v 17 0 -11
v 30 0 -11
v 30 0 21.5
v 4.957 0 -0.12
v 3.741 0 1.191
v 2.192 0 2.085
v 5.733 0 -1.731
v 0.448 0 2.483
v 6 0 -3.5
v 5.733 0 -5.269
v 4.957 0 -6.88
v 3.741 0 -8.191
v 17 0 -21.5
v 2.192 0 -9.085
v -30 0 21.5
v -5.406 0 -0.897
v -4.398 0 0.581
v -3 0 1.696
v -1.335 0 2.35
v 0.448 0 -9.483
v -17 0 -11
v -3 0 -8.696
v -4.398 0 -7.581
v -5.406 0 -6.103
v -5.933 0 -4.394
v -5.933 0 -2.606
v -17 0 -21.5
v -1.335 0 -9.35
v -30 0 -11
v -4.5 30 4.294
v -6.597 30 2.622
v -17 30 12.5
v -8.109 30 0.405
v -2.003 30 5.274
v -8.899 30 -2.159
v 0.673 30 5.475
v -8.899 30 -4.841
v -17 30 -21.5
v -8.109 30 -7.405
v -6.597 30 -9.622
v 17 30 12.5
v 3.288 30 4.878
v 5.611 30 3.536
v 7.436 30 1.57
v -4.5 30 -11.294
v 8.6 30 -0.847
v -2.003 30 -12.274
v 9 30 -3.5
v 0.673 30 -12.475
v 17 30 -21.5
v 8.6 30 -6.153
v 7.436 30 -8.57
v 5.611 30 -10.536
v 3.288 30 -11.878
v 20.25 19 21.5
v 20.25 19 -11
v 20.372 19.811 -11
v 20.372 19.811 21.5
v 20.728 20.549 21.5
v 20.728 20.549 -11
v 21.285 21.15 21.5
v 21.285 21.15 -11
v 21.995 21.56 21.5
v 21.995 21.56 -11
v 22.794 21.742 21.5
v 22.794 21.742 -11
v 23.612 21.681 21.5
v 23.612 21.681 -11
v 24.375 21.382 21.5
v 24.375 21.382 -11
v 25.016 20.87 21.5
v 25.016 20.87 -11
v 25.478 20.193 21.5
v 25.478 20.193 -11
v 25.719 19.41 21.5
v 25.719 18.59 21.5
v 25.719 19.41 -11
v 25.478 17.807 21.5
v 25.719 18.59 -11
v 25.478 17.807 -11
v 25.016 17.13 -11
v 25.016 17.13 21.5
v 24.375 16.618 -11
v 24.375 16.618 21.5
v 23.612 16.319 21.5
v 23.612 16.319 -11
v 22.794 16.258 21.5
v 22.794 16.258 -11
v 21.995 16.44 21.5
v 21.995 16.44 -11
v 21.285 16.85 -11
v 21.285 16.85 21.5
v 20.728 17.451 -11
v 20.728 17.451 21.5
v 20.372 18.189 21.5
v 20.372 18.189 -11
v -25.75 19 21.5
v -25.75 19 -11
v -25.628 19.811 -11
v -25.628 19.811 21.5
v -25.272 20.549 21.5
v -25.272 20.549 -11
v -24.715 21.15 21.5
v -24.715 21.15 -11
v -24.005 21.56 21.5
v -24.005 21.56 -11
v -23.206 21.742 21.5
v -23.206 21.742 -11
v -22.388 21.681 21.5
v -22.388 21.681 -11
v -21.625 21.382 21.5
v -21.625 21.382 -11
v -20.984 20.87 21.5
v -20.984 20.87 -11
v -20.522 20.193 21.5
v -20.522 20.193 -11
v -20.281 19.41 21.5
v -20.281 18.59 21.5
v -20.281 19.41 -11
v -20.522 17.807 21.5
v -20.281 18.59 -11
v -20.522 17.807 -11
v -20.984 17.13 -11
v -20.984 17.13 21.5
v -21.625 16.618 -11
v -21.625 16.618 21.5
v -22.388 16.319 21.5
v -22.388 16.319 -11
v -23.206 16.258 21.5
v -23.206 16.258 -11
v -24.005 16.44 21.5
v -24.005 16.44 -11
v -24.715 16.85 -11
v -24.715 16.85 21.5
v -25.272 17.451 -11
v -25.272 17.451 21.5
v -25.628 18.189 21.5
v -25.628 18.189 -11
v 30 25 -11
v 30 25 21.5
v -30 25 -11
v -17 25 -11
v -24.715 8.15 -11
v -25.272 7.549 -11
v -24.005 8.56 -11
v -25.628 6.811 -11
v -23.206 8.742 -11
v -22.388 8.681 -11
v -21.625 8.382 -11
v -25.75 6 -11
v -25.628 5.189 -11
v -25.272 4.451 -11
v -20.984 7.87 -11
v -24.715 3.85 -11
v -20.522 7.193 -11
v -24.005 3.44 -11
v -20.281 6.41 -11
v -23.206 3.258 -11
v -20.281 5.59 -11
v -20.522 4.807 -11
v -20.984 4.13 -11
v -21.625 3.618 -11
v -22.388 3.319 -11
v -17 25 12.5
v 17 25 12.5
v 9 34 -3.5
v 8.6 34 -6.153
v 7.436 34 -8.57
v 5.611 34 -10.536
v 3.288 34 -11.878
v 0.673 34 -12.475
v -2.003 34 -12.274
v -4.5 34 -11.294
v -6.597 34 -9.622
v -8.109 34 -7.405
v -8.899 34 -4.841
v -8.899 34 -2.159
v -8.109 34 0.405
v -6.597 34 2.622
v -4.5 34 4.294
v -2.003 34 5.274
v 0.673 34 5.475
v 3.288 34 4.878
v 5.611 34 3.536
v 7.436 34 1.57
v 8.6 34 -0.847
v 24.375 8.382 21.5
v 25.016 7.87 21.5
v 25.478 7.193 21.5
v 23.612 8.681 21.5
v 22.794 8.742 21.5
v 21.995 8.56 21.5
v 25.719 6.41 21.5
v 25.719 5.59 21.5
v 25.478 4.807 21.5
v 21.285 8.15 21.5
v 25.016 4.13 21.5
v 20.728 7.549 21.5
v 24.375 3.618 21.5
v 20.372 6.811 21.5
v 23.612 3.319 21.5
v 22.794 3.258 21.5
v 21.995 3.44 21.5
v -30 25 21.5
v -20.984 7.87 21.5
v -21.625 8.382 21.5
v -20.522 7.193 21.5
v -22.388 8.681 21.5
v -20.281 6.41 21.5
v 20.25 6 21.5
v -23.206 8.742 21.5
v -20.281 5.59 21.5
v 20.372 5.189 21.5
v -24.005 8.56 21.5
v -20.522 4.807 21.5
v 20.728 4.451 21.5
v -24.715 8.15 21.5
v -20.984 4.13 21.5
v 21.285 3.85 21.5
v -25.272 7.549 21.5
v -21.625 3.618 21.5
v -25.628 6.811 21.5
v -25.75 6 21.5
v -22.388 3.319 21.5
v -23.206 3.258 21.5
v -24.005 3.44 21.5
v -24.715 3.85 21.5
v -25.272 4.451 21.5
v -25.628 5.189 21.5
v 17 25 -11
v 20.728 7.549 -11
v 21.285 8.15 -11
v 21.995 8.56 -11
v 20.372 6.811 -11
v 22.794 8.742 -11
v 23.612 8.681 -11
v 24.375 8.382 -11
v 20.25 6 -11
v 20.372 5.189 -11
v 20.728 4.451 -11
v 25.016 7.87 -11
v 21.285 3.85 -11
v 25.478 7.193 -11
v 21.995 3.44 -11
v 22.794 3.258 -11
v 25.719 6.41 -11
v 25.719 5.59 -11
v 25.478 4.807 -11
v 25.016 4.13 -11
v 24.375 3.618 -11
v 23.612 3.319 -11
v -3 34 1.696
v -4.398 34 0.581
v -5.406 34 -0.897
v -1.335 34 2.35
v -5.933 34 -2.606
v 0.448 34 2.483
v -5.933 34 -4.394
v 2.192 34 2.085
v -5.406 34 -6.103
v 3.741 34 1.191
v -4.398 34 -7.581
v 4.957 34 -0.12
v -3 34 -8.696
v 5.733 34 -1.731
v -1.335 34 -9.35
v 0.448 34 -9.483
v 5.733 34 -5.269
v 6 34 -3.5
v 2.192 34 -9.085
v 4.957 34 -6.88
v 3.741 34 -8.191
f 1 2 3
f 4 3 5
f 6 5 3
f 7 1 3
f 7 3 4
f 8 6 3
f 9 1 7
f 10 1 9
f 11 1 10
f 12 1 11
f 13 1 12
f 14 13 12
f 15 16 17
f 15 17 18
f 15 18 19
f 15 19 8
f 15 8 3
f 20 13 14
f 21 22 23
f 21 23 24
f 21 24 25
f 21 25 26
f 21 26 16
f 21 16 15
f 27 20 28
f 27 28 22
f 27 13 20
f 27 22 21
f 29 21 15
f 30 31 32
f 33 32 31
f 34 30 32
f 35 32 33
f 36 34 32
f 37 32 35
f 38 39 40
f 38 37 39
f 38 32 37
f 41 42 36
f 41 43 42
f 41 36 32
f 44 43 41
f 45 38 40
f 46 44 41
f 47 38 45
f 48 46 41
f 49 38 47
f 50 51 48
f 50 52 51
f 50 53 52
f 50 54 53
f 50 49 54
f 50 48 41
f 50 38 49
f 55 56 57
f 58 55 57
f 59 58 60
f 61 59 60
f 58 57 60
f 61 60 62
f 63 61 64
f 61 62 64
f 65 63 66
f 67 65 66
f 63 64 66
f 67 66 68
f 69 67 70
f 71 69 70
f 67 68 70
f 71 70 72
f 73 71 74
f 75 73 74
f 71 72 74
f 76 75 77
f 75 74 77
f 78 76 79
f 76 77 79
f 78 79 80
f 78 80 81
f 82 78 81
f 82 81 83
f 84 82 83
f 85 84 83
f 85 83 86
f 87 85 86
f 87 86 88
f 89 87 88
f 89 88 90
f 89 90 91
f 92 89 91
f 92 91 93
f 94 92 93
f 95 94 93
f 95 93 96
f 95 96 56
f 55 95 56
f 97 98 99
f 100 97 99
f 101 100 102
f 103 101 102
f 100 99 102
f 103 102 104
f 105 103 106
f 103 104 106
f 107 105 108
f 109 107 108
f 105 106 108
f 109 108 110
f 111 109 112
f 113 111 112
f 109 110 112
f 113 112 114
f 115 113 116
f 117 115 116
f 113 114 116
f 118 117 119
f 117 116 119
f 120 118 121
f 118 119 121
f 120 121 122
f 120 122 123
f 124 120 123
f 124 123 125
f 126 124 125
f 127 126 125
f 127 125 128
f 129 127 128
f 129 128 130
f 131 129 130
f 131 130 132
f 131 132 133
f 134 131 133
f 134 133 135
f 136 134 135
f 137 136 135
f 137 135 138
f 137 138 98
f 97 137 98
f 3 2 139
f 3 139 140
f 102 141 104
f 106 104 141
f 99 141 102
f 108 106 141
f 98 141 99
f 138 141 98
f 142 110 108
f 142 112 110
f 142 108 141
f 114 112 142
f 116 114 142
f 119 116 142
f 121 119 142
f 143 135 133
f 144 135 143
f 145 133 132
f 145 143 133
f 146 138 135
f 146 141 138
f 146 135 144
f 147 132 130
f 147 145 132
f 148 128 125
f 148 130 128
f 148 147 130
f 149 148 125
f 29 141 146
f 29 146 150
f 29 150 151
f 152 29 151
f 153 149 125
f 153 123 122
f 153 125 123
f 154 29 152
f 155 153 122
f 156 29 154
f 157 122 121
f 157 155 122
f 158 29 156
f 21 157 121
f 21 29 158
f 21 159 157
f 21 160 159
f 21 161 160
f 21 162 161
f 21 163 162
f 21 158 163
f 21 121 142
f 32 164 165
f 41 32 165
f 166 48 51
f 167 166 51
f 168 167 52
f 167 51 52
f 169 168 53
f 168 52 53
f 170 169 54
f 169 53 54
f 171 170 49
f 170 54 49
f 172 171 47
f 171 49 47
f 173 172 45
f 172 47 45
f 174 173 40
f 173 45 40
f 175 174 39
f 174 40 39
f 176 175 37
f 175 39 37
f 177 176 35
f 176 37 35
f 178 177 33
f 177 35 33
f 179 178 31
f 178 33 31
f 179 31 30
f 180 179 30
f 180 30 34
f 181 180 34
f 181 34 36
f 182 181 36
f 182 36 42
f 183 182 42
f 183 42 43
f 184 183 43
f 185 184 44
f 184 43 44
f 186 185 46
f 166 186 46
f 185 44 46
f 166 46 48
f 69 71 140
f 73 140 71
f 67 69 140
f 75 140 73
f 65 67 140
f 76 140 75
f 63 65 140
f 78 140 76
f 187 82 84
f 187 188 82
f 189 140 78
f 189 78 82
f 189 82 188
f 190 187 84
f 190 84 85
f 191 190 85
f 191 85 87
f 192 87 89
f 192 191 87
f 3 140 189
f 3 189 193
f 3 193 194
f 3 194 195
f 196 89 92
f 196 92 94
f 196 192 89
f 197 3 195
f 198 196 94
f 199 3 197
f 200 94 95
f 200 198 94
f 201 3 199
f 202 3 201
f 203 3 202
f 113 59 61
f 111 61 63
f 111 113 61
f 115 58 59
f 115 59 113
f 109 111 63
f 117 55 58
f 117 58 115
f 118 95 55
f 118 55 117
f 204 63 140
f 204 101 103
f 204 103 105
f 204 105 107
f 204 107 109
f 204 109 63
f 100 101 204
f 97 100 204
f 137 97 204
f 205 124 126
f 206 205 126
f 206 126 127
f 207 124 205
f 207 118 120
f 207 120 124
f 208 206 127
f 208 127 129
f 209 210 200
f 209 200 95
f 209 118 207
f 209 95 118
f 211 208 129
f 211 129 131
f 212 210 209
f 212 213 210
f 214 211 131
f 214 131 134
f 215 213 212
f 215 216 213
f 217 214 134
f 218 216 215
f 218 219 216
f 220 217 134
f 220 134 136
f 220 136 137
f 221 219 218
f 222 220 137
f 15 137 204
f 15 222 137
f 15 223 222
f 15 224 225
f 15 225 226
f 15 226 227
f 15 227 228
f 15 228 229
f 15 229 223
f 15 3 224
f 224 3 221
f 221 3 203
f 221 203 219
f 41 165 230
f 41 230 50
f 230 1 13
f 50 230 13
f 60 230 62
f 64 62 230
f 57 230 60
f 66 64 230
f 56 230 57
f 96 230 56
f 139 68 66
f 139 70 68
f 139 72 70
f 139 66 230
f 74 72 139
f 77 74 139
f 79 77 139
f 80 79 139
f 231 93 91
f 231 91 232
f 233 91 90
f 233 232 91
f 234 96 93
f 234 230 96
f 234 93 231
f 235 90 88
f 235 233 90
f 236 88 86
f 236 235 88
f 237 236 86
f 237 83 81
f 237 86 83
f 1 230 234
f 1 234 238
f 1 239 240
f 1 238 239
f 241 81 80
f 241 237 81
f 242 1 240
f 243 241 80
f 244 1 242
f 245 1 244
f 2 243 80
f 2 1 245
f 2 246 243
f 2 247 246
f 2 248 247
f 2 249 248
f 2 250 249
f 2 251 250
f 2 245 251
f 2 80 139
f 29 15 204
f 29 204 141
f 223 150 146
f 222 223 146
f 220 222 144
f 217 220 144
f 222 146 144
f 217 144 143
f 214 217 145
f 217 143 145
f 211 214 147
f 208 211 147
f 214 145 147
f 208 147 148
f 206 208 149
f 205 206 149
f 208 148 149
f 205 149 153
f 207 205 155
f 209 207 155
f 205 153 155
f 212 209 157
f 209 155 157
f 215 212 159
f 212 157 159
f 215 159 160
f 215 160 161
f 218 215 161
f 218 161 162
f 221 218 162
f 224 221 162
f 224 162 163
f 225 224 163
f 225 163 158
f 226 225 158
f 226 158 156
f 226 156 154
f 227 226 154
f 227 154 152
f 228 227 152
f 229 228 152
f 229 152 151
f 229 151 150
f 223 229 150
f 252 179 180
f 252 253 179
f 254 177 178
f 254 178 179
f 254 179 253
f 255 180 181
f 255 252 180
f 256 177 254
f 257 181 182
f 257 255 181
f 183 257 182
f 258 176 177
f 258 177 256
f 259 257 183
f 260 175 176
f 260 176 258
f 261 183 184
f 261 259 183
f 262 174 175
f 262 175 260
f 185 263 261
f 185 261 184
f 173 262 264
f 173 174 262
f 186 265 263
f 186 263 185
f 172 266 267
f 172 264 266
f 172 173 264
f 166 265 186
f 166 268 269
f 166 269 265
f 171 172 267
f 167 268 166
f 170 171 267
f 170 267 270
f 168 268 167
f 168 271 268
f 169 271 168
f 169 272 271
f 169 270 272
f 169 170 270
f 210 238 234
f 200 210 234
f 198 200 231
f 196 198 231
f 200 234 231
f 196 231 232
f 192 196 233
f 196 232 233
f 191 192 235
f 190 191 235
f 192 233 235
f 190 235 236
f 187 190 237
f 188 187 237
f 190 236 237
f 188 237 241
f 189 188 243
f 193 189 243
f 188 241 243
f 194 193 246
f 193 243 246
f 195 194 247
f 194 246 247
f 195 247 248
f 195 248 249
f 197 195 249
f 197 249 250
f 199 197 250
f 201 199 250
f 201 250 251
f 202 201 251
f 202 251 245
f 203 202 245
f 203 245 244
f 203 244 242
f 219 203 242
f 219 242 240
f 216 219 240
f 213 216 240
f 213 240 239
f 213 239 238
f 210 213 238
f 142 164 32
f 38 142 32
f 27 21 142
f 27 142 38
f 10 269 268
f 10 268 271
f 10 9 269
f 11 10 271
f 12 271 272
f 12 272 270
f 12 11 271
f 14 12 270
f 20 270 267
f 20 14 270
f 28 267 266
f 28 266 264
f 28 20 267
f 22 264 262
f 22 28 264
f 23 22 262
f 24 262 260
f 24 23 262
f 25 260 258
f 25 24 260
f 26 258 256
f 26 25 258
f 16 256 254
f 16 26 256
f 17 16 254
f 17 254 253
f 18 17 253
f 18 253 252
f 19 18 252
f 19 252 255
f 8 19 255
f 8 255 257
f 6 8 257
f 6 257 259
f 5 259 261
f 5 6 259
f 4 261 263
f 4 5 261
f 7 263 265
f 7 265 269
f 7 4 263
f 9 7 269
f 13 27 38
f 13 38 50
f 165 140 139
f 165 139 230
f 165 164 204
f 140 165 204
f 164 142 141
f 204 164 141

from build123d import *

# Parameters (mm, degrees)
SKETCH1_R           = 6
BOSS_EXTRUDE1_DEPTH = 25
SKETCH2_R           = 2.75
CUT_EXTRUDE1_DEPTH  = 33.5
SKETCH3_W           = 34
SKETCH3_H           = 34
SKETCH3_R           = 6
BOSS_EXTRUDE2_DEPTH = 5
SKETCH4_R           = 9
SKETCH4_R_2         = 6
BOSS_EXTRUDE3_DEPTH = 4


with BuildPart() as part:
    # Sketch1 → Boss-Extrude1 (new body)
    with BuildSketch(Plane(origin=(0, 0, 0), x_dir=(1, 0, 0), z_dir=(0, 1, 0))):
        Polygon((30, -21.5), (-30, -21.5), (-30, 11), (-17, 11), (-17, 21.5), (17, 21.5), (17, 11), (30, 11), align=None)
        with Locations((0, 3.5)):
            Circle(SKETCH1_R, mode=Mode.SUBTRACT)
    extrude(amount=BOSS_EXTRUDE1_DEPTH)

    # Sketch2 → Cut-Extrude1 (cut, through all)
    with BuildSketch(Plane(origin=(0, 0, -11), x_dir=(-1, 0, 0), z_dir=(0, 0, -1))):
        with Locations((-23, 19)):
            Circle(SKETCH2_R)
        with Locations((-23, 6)):
            Circle(SKETCH2_R)
        with Locations((23, 6)):
            Circle(SKETCH2_R)
        with Locations((23, 19)):
            Circle(SKETCH2_R)
    extrude(amount=-CUT_EXTRUDE1_DEPTH, mode=Mode.SUBTRACT)

    # Sketch3 → Boss-Extrude2 (add)
    with BuildSketch(Plane(origin=(0, 25, 0), x_dir=(1, 0, 0), z_dir=(0, 1, 0))):
        with Locations((0, 4.5)):
            Rectangle(SKETCH3_W, SKETCH3_H)
        with Locations((0, 3.5)):
            Circle(SKETCH3_R, mode=Mode.SUBTRACT)
    extrude(amount=BOSS_EXTRUDE2_DEPTH)

    # Sketch4 → Boss-Extrude3 (add)
    with BuildSketch(Plane(origin=(0, 30, 0), x_dir=(1, 0, 0), z_dir=(0, 1, 0))):
        with Locations((0, 3.5)):
            Circle(SKETCH4_R)
        with Locations((0, 3.5)):
            Circle(SKETCH4_R_2, mode=Mode.SUBTRACT)
    extrude(amount=BOSS_EXTRUDE3_DEPTH)


solid = part.part
